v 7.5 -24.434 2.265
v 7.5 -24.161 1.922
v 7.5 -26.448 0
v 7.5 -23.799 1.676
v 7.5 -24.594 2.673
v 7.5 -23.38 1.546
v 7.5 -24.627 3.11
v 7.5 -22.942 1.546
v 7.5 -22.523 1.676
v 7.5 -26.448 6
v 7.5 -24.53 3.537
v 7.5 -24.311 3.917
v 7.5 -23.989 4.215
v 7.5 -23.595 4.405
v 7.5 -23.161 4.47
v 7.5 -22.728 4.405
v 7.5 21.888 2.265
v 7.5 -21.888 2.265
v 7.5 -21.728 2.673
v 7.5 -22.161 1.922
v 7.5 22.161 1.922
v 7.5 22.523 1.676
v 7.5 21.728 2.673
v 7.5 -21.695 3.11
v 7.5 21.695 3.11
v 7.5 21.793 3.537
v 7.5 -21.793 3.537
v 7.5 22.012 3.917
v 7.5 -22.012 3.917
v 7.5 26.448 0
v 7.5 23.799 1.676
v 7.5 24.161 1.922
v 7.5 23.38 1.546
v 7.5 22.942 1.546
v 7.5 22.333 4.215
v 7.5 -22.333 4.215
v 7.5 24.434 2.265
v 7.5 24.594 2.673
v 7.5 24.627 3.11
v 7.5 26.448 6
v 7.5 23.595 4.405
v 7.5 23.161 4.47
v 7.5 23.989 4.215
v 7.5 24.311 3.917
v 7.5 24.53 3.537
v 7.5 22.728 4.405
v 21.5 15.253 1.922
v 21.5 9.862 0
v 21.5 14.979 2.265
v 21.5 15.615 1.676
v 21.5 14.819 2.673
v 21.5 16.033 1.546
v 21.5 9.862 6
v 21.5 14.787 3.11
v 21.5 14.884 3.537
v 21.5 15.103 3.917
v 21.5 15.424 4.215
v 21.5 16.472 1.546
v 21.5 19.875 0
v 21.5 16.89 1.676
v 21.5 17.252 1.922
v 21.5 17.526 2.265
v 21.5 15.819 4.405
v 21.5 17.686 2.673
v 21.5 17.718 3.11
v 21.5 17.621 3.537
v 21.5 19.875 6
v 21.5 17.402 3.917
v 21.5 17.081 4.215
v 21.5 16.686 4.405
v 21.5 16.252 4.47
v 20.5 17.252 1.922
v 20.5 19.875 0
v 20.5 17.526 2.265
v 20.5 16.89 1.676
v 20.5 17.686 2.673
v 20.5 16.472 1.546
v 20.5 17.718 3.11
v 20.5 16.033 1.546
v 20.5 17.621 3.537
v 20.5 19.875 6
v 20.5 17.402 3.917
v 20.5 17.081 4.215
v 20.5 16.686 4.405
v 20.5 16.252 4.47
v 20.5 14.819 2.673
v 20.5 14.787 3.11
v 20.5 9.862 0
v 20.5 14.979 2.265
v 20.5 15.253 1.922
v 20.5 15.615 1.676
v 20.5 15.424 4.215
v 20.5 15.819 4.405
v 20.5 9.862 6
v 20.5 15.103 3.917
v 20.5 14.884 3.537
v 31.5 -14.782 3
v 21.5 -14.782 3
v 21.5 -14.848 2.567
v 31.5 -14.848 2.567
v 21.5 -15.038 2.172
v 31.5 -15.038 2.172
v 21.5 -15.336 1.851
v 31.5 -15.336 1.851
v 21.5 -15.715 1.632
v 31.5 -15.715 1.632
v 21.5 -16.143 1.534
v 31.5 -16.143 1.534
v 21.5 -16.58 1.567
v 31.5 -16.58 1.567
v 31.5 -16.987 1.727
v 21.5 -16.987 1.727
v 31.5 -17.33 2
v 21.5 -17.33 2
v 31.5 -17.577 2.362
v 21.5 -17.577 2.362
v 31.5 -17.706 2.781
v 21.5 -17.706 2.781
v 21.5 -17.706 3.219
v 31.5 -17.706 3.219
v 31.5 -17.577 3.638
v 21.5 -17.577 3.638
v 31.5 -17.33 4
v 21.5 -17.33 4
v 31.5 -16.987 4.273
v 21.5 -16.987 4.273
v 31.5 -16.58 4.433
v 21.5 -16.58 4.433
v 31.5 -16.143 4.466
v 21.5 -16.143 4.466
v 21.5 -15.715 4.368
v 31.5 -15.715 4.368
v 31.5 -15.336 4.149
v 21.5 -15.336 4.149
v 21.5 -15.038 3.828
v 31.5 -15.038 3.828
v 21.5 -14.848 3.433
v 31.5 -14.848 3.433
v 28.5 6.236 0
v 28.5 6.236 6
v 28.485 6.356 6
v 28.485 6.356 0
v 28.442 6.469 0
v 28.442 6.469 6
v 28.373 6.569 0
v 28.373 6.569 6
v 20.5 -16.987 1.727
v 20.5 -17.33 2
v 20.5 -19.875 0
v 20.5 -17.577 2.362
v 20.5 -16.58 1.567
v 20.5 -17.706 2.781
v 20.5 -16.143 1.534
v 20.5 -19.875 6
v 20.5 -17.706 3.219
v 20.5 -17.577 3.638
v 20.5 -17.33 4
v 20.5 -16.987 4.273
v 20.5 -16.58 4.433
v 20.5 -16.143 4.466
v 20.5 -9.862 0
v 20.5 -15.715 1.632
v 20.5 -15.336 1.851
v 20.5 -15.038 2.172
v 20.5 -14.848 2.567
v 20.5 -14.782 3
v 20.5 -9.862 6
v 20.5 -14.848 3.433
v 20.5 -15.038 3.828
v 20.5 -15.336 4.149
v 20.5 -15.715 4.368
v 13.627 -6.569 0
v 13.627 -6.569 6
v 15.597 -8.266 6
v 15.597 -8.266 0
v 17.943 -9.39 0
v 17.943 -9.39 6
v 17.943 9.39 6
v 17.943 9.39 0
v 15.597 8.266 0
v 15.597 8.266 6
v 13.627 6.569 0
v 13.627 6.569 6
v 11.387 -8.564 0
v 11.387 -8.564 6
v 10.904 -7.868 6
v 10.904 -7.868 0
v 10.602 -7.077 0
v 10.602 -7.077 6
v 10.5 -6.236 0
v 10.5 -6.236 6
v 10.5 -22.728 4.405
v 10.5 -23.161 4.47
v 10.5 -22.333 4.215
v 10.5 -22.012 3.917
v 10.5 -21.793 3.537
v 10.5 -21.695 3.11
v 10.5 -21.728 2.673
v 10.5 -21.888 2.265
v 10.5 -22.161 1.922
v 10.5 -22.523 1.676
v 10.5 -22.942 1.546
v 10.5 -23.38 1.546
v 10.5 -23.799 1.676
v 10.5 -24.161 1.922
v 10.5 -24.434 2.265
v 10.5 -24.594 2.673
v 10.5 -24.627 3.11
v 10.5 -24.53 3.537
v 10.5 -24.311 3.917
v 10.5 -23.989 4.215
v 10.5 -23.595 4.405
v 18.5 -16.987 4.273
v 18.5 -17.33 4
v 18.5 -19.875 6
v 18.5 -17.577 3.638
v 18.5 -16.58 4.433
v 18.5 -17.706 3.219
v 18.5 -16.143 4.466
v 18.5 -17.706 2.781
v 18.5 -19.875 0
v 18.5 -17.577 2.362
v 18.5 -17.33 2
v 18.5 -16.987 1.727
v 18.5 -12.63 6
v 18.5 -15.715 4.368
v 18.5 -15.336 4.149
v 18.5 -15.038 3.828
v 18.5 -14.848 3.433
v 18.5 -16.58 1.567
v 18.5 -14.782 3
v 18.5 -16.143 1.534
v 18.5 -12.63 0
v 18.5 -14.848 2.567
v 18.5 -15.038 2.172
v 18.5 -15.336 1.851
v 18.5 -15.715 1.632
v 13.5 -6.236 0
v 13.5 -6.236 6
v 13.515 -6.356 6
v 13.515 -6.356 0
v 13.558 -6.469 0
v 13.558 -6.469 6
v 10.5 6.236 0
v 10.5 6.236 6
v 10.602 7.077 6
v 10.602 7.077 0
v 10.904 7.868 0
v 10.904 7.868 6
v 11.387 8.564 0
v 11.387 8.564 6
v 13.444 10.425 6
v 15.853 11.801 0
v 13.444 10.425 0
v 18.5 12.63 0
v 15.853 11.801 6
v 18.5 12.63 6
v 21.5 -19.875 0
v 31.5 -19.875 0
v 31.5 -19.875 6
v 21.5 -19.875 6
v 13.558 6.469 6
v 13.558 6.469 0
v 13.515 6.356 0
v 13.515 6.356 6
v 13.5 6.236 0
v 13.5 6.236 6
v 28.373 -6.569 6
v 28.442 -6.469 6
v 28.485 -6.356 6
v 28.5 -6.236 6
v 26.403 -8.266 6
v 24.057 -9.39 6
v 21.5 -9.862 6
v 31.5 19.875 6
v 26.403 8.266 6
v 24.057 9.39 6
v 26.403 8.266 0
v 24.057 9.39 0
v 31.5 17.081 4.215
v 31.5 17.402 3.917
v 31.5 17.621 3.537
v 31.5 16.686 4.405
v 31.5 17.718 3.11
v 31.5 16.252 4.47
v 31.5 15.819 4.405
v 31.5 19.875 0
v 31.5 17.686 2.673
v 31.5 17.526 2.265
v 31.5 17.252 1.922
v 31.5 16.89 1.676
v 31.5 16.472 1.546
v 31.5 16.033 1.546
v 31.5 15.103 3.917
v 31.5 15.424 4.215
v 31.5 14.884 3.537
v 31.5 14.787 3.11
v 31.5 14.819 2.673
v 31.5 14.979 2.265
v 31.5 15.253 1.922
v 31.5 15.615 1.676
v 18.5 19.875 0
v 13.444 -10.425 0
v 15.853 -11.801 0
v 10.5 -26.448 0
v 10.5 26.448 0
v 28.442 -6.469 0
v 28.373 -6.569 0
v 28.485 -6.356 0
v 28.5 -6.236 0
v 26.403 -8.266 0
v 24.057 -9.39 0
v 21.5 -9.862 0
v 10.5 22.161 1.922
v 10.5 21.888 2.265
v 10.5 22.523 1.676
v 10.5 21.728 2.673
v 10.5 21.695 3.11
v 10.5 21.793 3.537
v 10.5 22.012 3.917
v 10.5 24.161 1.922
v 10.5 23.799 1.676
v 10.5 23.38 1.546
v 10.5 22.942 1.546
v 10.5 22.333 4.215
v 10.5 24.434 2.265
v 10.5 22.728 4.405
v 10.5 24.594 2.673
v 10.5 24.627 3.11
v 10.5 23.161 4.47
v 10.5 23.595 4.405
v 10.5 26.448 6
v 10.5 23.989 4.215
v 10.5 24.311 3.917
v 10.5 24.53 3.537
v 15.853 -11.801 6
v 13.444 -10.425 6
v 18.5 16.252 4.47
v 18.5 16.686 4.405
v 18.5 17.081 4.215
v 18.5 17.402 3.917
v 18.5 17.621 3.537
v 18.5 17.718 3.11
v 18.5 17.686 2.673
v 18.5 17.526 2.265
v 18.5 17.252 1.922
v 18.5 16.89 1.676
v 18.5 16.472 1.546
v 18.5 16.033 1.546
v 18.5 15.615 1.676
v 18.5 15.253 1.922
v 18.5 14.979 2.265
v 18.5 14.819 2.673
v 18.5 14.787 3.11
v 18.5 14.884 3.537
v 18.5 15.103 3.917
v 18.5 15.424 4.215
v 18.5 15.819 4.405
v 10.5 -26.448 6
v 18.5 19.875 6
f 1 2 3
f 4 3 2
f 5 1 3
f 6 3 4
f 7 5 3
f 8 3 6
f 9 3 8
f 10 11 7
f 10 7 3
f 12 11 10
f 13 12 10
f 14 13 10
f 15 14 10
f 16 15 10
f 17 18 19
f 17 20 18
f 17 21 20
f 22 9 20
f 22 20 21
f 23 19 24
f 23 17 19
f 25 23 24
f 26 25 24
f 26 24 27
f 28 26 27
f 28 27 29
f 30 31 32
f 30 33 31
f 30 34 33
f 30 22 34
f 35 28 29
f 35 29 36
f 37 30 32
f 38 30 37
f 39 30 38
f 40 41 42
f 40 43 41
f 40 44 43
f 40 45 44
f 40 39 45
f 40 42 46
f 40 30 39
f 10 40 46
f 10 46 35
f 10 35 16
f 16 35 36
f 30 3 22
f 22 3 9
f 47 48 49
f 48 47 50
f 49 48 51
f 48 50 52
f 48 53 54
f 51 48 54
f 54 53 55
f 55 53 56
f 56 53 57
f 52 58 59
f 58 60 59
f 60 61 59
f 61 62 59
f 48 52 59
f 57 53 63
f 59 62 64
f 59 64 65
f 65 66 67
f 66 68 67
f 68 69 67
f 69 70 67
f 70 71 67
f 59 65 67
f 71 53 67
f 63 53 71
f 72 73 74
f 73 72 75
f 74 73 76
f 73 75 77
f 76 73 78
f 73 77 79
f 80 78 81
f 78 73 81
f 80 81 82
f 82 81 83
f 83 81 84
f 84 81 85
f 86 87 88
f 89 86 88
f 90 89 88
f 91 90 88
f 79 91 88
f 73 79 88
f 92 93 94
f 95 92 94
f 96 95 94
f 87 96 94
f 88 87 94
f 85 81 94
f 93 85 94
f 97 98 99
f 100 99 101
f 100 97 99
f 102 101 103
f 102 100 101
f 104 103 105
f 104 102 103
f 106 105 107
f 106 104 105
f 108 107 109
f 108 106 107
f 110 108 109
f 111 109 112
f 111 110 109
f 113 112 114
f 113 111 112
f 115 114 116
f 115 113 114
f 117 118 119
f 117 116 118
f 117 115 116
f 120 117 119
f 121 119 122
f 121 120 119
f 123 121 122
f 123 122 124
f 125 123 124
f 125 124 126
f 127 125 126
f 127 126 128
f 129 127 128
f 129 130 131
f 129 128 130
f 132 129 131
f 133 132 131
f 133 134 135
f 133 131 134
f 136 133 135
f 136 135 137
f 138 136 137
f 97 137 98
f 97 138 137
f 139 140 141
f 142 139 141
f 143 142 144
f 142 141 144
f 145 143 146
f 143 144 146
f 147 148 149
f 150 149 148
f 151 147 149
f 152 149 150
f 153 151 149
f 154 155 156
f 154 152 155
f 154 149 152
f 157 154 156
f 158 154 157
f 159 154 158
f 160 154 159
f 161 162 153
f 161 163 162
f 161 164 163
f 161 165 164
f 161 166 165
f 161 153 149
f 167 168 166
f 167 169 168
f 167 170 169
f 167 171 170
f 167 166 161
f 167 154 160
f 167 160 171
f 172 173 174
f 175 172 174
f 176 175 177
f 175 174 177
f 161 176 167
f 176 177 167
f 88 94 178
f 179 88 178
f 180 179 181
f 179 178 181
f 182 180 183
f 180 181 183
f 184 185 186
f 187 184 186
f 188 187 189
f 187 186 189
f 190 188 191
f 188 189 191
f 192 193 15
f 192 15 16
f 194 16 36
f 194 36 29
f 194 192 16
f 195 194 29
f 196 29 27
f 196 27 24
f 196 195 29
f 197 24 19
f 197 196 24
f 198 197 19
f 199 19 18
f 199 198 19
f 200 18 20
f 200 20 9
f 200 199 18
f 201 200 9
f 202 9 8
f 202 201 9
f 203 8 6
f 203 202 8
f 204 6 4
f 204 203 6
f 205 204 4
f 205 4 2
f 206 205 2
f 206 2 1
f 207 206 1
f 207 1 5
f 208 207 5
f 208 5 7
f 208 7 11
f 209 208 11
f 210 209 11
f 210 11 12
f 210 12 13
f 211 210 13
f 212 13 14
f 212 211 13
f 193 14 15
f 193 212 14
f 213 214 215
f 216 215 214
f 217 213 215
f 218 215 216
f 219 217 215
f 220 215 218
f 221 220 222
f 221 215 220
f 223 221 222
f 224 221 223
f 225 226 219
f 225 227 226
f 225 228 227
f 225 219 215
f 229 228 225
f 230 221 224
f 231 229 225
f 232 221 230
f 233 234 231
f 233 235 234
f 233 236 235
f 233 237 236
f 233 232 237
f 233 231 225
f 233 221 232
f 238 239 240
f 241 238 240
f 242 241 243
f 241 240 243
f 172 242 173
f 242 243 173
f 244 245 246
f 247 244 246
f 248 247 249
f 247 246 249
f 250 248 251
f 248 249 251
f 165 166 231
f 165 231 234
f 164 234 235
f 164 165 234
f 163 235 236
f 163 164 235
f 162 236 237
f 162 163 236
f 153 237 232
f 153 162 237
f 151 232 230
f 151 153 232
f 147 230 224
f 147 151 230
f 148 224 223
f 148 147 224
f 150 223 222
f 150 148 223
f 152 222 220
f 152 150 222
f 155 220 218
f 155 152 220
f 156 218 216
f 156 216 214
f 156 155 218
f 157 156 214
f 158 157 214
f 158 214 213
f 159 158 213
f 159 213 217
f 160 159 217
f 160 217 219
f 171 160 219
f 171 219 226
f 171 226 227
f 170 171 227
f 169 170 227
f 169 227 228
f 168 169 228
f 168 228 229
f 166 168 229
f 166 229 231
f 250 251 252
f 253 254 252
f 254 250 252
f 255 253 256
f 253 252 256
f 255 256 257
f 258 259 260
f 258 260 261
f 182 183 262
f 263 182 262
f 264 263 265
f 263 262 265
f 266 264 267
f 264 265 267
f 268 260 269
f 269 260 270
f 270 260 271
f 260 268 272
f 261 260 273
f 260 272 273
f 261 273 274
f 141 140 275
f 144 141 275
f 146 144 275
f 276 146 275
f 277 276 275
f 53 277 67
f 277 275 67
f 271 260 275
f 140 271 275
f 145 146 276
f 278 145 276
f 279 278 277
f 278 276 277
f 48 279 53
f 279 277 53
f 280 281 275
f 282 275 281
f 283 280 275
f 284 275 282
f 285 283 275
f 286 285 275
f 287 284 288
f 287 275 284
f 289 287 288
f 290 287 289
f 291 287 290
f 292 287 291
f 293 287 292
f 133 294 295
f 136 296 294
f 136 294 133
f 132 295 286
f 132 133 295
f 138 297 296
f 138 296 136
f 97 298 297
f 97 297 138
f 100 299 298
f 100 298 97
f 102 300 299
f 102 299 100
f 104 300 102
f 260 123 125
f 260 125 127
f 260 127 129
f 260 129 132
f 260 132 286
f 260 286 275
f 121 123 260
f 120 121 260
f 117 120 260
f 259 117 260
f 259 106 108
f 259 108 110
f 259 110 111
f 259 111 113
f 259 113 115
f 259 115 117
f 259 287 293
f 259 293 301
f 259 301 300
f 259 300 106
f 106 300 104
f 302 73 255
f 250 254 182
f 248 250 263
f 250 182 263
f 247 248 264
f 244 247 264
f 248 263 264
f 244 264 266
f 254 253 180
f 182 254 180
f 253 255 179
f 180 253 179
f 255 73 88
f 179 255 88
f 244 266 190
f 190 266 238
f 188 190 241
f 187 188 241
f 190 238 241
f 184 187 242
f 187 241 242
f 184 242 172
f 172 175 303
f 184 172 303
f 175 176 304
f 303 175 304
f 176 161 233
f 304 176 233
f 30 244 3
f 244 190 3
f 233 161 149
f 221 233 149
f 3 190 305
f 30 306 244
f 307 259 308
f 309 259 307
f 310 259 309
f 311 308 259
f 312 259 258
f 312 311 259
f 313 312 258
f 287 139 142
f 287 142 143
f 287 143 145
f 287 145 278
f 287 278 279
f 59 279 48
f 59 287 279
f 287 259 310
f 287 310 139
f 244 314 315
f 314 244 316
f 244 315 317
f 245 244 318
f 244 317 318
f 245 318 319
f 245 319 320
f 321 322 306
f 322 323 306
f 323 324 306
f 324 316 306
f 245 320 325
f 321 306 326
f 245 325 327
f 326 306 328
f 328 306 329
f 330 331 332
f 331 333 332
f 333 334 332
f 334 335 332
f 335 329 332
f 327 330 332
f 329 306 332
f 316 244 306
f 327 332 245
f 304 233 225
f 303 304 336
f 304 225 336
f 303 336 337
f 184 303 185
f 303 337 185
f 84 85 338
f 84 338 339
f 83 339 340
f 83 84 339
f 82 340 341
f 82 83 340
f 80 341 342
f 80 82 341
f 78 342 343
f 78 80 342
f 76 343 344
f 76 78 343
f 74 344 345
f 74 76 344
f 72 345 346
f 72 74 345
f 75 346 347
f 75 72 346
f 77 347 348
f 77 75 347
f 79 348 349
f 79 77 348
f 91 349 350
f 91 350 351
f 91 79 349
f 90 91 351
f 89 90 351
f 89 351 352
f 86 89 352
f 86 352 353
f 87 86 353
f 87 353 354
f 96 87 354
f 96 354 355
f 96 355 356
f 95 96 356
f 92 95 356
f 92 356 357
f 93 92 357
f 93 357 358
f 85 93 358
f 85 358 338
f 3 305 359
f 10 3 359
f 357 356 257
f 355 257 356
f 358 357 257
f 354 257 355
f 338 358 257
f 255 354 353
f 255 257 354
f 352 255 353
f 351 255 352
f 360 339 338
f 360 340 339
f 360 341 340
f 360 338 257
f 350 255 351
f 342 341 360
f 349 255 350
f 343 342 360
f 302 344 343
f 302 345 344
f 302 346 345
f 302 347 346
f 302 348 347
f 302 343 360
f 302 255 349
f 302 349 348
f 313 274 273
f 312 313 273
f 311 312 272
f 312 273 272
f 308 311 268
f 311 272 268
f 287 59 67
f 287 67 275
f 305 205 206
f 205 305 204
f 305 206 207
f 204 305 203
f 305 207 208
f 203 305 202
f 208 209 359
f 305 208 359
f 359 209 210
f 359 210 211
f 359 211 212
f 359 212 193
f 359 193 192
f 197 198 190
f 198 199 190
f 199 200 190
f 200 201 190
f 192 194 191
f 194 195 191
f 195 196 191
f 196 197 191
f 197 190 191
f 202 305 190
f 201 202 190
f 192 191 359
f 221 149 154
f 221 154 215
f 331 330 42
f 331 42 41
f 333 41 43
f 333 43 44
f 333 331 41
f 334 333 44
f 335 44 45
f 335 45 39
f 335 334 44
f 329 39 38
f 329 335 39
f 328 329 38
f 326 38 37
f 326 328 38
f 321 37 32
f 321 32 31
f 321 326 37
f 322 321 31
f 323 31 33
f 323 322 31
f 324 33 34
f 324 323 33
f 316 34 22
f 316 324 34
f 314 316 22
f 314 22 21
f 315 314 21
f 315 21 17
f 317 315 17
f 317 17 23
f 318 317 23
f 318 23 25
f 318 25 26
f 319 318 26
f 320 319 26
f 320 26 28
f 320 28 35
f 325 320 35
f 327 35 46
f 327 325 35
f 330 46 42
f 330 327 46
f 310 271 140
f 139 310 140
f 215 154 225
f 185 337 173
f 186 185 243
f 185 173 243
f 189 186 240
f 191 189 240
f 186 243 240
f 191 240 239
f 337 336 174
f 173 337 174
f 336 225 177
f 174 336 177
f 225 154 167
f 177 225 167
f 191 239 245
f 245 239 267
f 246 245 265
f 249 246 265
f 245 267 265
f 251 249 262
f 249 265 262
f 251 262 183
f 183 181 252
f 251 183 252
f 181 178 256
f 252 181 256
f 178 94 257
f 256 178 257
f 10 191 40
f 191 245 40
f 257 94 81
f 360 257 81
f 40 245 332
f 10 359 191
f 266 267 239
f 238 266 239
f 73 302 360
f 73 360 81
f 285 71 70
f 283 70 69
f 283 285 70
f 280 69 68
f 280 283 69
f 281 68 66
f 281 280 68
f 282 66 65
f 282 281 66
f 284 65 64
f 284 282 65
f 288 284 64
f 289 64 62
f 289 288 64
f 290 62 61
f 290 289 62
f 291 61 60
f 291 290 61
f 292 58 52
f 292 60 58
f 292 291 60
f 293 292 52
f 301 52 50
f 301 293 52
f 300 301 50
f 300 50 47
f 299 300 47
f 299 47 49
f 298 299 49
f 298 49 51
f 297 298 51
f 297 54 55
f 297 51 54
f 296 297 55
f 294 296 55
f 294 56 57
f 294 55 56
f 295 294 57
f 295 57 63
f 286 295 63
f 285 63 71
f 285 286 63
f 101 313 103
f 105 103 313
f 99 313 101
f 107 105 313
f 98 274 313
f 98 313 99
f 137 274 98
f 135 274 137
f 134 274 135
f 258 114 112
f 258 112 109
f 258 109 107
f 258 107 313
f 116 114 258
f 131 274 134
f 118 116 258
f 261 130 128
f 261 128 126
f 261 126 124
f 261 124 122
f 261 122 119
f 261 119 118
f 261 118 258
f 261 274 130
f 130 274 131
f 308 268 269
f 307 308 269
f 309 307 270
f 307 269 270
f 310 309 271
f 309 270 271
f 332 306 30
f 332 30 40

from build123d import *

# Parameters (mm, degrees)
SKETCH1_W           = 65
SKETCH1_H           = 65
BOSS_EXTRUDE1_DEPTH = 6
SKETCH3_W           = 65
SKETCH3_H           = 65
CUT_EXTRUDE2_DEPTH  = 10
BOSS_EXTRUDE2_DEPTH = 6
CUT_EXTRUDE3_REACH  = 39.726
CUT_EXTRUDE4_START  = -13
SKETCH7_R           = 1.47
CUT_EXTRUDE4_DEPTH  = 13
SKETCH8_W           = 6
SKETCH8_H           = 6.572516921
SKETCH8_R           = 1.47
SKETCH8_H_2         = 13.638765158
SKETCH8_H_3         = 12.472469684
BOSS_EXTRUDE3_DEPTH = 3


with BuildPart() as part:
    # Sketch1 → Boss-Extrude1 (new body)
    with BuildSketch(Plane.XY):
        Rectangle(SKETCH1_W, SKETCH1_H)
    extrude(amount=BOSS_EXTRUDE1_DEPTH)

    # Sketch3 → Cut-Extrude2 (cut)
    with BuildSketch(Plane.XY.offset(6)):
        Rectangle(SKETCH3_W, SKETCH3_H)
        with BuildLine():
            Line((10.5, 4.597893539), (10.5, 6.236234842))
            ThreePointArc((10.5, 6.236234842), (10.729169321, 7.481893971), (11.386666667, 8.564429183))
            ThreePointArc((11.386666667, 8.564429183), (21, 12.875), (30.613333333, 8.564429183))
            ThreePointArc((30.613333333, 8.564429183), (31.270830679, 7.481893971), (31.5, 6.236234842))
            Line((31.5, 6.236234842), (31.5, 4.597893539))
            Line((31.5, 4.597893539), (31.5, -4.597893539))
            Line((31.5, -4.597893539), (31.5, -6.236234842))
            ThreePointArc((31.5, -6.236234842), (31.270830679, -7.481893971), (30.613333333, -8.564429183))
            ThreePointArc((30.613333333, -8.564429183), (21, -12.875), (11.386666667, -8.564429183))
            ThreePointArc((11.386666667, -8.564429183), (10.729169321, -7.481893971), (10.5, -6.236234842))
            Line((10.5, -6.236234842), (10.5, -4.597893539))
            Line((10.5, -4.597893539), (10.5, 4.597893539))
        make_face(mode=Mode.SUBTRACT)
        with BuildLine():
            ThreePointArc((28.5, 6.236234842), (28.467261526, 6.414186146), (28.373333333, 6.568834033))
            ThreePointArc((28.373333333, 6.568834033), (21, 9.875), (13.626666667, 6.568834033))
            ThreePointArc((13.626666667, 6.568834033), (13.532738474, 6.414186146), (13.5, 6.236234842))
            Line((13.5, 6.236234842), (13.5, 4.597893539))
            Line((13.5, 4.597893539), (13.5, -4.597893539))
            Line((13.5, -4.597893539), (13.5, -6.236234842))
            ThreePointArc((13.5, -6.236234842), (13.532738474, -6.414186146), (13.626666667, -6.568834033))
            ThreePointArc((13.626666667, -6.568834033), (21, -9.875), (28.373333333, -6.568834033))
            ThreePointArc((28.373333333, -6.568834033), (28.467261526, -6.414186146), (28.5, -6.236234842))
            Line((28.5, -6.236234842), (28.5, -4.597893539))
            Line((28.5, -4.597893539), (28.5, 4.597893539))
            Line((28.5, 4.597893539), (28.5, 6.236234842))
        make_face()
    extrude(amount=-CUT_EXTRUDE2_DEPTH, mode=Mode.SUBTRACT)

    # Sketch4 → Boss-Extrude2 (add)
    with BuildSketch(Plane(origin=(0, 0, 0), x_dir=(-1, 0, 0), z_dir=(0, 0, -1))):
        with BuildLine():
            ThreePointArc((-30.613333333, 8.564429183), (-26.267760401, 11.748034957), (-21, 12.875))
            Line((-21, 12.875), (-21, 19.875))
            Line((-21, 19.875), (-31.5, 19.875))
            Line((-31.5, 19.875), (-31.5, 6.236234842))
            ThreePointArc((-31.5, 6.236234842), (-31.270830679, 7.481893971), (-30.613333333, 8.564429183))
        make_face()
        with BuildLine():
            Line((-21, 19.875), (-21, 12.875))
            ThreePointArc((-21, 12.875), (-19.744009381, 12.813590932), (-18.5, 12.629949525))
            Line((-18.5, 12.629949525), (-18.5, 19.875))
            Line((-18.5, 19.875), (-21, 19.875))
        make_face()
        with BuildLine():
            Line((-21, -19.875), (-18.5, -19.875))
            Line((-18.5, -19.875), (-18.5, -12.629949525))
            ThreePointArc((-18.5, -12.629949525), (-25.096582929, -12.205885192), (-30.613333333, -8.564429183))
            ThreePointArc((-30.613333333, -8.564429183), (-31.270830679, -7.481893971), (-31.5, -6.236234842))
            Line((-31.5, -6.236234842), (-31.5, -19.875))
            Line((-31.5, -19.875), (-21, -19.875))
        make_face()
    extrude(amount=-BOSS_EXTRUDE2_DEPTH)

    # Sketch6 → Cut-Extrude3 (cut, up to next)
    with BuildSketch(Plane.XY.offset(6), mode=Mode.PRIVATE) as cut_extrude3_sk1:
        with BuildLine():
            Line((21.5, 19.875), (20.5, 19.875))
            Line((20.5, 19.875), (20.5, 9.862333649))
            ThreePointArc((20.5, 9.862333649), (21, 9.875), (21.5, 9.862333649))
            Line((21.5, 9.862333649), (21.5, 19.875))
        make_face()
    cut_extrude3_tool1 = extrude(cut_extrude3_sk1.sketch, amount=-CUT_EXTRUDE3_REACH, mode=Mode.PRIVATE) & part.part
    # Sketch6 → Cut-Extrude3 (cut, up to next)
    with BuildSketch(Plane.XY.offset(6), mode=Mode.PRIVATE) as cut_extrude3_sk2:
        with BuildLine():
            Line((20.5, -19.875), (20.5, -9.862333649))
            ThreePointArc((20.5, -9.862333649), (21, -9.875), (21.5, -9.862333649))
            Line((21.5, -9.862333649), (21.5, -19.875))
            Line((21.5, -19.875), (20.5, -19.875))
        make_face()
    cut_extrude3_tool2 = extrude(cut_extrude3_sk2.sketch, amount=-CUT_EXTRUDE3_REACH, mode=Mode.PRIVATE) & part.part
    add(cut_extrude3_tool1.solids().sort_by_distance((21, 14.872889, 6))[0], mode=Mode.SUBTRACT)
    add(cut_extrude3_tool2.solids().sort_by_distance((21, -14.872889, 6))[0], mode=Mode.SUBTRACT)


with BuildPart() as cut_extrude3_piece_1:
    # of the separate pieces the step leaves, piece 1, a body of its own (cut_extrude3_pieces)
    add(part.part.solids().sort_by_distance((21.5, -19.875, 0))[0])


with BuildPart() as cut_extrude3_piece_2:
    # of the separate pieces the step leaves, piece 2, a body of its own (cut_extrude3_pieces)
    add(part.part.solids().sort_by_distance((10.5, -6.236234842, 0))[0])


with BuildPart() as cut_extrude4_tool:
    # Sketch7 → Cut-Extrude4 (new body)
    with BuildSketch(Plane.ZY.offset(-18.5).offset(CUT_EXTRUDE4_START)):
        with Locations((3, 16.252474762)):
            Circle(SKETCH7_R)
        with Locations(Location((3, -16.252474762, 0), (0, 0, 90))):
            Circle(SKETCH7_R)
    extrude(amount=CUT_EXTRUDE4_DEPTH)


with BuildPart() as cut_extrude3_piece_1_1:
    add(cut_extrude3_piece_1.part)

    # Cut-Extrude4: cut by cut_extrude4_tool
    add(cut_extrude4_tool.part, mode=Mode.SUBTRACT)


with BuildPart() as cut_extrude3_piece_2_1:
    add(cut_extrude3_piece_2.part)

    # Cut-Extrude4: cut by cut_extrude4_tool
    add(cut_extrude4_tool.part, mode=Mode.SUBTRACT)

    # Sketch8 → Boss-Extrude3 (add)
    with BuildSketch(Plane.ZY.offset(-10.5)):
        with Locations((3, -23.161258461)):
            Rectangle(SKETCH8_W, SKETCH8_H)
        with Locations((3, -23.16125846)):
            Circle(SKETCH8_R, mode=Mode.SUBTRACT)
        with Locations((3, -13.055617421)):
            Rectangle(SKETCH8_W, SKETCH8_H_2)
        with Locations((3, 0)):
            Rectangle(SKETCH8_W, SKETCH8_H_3)
        with Locations((3, 13.055617421)):
            Rectangle(SKETCH8_W, SKETCH8_H_2)
        with Locations((3, 23.161258461)):
            Rectangle(SKETCH8_W, SKETCH8_H)
        with Locations((3, 23.16125846)):
            Circle(SKETCH8_R, mode=Mode.SUBTRACT)
    extrude(amount=BOSS_EXTRUDE3_DEPTH)


solid = Compound([cut_extrude3_piece_1_1.part, cut_extrude3_piece_2_1.part])
